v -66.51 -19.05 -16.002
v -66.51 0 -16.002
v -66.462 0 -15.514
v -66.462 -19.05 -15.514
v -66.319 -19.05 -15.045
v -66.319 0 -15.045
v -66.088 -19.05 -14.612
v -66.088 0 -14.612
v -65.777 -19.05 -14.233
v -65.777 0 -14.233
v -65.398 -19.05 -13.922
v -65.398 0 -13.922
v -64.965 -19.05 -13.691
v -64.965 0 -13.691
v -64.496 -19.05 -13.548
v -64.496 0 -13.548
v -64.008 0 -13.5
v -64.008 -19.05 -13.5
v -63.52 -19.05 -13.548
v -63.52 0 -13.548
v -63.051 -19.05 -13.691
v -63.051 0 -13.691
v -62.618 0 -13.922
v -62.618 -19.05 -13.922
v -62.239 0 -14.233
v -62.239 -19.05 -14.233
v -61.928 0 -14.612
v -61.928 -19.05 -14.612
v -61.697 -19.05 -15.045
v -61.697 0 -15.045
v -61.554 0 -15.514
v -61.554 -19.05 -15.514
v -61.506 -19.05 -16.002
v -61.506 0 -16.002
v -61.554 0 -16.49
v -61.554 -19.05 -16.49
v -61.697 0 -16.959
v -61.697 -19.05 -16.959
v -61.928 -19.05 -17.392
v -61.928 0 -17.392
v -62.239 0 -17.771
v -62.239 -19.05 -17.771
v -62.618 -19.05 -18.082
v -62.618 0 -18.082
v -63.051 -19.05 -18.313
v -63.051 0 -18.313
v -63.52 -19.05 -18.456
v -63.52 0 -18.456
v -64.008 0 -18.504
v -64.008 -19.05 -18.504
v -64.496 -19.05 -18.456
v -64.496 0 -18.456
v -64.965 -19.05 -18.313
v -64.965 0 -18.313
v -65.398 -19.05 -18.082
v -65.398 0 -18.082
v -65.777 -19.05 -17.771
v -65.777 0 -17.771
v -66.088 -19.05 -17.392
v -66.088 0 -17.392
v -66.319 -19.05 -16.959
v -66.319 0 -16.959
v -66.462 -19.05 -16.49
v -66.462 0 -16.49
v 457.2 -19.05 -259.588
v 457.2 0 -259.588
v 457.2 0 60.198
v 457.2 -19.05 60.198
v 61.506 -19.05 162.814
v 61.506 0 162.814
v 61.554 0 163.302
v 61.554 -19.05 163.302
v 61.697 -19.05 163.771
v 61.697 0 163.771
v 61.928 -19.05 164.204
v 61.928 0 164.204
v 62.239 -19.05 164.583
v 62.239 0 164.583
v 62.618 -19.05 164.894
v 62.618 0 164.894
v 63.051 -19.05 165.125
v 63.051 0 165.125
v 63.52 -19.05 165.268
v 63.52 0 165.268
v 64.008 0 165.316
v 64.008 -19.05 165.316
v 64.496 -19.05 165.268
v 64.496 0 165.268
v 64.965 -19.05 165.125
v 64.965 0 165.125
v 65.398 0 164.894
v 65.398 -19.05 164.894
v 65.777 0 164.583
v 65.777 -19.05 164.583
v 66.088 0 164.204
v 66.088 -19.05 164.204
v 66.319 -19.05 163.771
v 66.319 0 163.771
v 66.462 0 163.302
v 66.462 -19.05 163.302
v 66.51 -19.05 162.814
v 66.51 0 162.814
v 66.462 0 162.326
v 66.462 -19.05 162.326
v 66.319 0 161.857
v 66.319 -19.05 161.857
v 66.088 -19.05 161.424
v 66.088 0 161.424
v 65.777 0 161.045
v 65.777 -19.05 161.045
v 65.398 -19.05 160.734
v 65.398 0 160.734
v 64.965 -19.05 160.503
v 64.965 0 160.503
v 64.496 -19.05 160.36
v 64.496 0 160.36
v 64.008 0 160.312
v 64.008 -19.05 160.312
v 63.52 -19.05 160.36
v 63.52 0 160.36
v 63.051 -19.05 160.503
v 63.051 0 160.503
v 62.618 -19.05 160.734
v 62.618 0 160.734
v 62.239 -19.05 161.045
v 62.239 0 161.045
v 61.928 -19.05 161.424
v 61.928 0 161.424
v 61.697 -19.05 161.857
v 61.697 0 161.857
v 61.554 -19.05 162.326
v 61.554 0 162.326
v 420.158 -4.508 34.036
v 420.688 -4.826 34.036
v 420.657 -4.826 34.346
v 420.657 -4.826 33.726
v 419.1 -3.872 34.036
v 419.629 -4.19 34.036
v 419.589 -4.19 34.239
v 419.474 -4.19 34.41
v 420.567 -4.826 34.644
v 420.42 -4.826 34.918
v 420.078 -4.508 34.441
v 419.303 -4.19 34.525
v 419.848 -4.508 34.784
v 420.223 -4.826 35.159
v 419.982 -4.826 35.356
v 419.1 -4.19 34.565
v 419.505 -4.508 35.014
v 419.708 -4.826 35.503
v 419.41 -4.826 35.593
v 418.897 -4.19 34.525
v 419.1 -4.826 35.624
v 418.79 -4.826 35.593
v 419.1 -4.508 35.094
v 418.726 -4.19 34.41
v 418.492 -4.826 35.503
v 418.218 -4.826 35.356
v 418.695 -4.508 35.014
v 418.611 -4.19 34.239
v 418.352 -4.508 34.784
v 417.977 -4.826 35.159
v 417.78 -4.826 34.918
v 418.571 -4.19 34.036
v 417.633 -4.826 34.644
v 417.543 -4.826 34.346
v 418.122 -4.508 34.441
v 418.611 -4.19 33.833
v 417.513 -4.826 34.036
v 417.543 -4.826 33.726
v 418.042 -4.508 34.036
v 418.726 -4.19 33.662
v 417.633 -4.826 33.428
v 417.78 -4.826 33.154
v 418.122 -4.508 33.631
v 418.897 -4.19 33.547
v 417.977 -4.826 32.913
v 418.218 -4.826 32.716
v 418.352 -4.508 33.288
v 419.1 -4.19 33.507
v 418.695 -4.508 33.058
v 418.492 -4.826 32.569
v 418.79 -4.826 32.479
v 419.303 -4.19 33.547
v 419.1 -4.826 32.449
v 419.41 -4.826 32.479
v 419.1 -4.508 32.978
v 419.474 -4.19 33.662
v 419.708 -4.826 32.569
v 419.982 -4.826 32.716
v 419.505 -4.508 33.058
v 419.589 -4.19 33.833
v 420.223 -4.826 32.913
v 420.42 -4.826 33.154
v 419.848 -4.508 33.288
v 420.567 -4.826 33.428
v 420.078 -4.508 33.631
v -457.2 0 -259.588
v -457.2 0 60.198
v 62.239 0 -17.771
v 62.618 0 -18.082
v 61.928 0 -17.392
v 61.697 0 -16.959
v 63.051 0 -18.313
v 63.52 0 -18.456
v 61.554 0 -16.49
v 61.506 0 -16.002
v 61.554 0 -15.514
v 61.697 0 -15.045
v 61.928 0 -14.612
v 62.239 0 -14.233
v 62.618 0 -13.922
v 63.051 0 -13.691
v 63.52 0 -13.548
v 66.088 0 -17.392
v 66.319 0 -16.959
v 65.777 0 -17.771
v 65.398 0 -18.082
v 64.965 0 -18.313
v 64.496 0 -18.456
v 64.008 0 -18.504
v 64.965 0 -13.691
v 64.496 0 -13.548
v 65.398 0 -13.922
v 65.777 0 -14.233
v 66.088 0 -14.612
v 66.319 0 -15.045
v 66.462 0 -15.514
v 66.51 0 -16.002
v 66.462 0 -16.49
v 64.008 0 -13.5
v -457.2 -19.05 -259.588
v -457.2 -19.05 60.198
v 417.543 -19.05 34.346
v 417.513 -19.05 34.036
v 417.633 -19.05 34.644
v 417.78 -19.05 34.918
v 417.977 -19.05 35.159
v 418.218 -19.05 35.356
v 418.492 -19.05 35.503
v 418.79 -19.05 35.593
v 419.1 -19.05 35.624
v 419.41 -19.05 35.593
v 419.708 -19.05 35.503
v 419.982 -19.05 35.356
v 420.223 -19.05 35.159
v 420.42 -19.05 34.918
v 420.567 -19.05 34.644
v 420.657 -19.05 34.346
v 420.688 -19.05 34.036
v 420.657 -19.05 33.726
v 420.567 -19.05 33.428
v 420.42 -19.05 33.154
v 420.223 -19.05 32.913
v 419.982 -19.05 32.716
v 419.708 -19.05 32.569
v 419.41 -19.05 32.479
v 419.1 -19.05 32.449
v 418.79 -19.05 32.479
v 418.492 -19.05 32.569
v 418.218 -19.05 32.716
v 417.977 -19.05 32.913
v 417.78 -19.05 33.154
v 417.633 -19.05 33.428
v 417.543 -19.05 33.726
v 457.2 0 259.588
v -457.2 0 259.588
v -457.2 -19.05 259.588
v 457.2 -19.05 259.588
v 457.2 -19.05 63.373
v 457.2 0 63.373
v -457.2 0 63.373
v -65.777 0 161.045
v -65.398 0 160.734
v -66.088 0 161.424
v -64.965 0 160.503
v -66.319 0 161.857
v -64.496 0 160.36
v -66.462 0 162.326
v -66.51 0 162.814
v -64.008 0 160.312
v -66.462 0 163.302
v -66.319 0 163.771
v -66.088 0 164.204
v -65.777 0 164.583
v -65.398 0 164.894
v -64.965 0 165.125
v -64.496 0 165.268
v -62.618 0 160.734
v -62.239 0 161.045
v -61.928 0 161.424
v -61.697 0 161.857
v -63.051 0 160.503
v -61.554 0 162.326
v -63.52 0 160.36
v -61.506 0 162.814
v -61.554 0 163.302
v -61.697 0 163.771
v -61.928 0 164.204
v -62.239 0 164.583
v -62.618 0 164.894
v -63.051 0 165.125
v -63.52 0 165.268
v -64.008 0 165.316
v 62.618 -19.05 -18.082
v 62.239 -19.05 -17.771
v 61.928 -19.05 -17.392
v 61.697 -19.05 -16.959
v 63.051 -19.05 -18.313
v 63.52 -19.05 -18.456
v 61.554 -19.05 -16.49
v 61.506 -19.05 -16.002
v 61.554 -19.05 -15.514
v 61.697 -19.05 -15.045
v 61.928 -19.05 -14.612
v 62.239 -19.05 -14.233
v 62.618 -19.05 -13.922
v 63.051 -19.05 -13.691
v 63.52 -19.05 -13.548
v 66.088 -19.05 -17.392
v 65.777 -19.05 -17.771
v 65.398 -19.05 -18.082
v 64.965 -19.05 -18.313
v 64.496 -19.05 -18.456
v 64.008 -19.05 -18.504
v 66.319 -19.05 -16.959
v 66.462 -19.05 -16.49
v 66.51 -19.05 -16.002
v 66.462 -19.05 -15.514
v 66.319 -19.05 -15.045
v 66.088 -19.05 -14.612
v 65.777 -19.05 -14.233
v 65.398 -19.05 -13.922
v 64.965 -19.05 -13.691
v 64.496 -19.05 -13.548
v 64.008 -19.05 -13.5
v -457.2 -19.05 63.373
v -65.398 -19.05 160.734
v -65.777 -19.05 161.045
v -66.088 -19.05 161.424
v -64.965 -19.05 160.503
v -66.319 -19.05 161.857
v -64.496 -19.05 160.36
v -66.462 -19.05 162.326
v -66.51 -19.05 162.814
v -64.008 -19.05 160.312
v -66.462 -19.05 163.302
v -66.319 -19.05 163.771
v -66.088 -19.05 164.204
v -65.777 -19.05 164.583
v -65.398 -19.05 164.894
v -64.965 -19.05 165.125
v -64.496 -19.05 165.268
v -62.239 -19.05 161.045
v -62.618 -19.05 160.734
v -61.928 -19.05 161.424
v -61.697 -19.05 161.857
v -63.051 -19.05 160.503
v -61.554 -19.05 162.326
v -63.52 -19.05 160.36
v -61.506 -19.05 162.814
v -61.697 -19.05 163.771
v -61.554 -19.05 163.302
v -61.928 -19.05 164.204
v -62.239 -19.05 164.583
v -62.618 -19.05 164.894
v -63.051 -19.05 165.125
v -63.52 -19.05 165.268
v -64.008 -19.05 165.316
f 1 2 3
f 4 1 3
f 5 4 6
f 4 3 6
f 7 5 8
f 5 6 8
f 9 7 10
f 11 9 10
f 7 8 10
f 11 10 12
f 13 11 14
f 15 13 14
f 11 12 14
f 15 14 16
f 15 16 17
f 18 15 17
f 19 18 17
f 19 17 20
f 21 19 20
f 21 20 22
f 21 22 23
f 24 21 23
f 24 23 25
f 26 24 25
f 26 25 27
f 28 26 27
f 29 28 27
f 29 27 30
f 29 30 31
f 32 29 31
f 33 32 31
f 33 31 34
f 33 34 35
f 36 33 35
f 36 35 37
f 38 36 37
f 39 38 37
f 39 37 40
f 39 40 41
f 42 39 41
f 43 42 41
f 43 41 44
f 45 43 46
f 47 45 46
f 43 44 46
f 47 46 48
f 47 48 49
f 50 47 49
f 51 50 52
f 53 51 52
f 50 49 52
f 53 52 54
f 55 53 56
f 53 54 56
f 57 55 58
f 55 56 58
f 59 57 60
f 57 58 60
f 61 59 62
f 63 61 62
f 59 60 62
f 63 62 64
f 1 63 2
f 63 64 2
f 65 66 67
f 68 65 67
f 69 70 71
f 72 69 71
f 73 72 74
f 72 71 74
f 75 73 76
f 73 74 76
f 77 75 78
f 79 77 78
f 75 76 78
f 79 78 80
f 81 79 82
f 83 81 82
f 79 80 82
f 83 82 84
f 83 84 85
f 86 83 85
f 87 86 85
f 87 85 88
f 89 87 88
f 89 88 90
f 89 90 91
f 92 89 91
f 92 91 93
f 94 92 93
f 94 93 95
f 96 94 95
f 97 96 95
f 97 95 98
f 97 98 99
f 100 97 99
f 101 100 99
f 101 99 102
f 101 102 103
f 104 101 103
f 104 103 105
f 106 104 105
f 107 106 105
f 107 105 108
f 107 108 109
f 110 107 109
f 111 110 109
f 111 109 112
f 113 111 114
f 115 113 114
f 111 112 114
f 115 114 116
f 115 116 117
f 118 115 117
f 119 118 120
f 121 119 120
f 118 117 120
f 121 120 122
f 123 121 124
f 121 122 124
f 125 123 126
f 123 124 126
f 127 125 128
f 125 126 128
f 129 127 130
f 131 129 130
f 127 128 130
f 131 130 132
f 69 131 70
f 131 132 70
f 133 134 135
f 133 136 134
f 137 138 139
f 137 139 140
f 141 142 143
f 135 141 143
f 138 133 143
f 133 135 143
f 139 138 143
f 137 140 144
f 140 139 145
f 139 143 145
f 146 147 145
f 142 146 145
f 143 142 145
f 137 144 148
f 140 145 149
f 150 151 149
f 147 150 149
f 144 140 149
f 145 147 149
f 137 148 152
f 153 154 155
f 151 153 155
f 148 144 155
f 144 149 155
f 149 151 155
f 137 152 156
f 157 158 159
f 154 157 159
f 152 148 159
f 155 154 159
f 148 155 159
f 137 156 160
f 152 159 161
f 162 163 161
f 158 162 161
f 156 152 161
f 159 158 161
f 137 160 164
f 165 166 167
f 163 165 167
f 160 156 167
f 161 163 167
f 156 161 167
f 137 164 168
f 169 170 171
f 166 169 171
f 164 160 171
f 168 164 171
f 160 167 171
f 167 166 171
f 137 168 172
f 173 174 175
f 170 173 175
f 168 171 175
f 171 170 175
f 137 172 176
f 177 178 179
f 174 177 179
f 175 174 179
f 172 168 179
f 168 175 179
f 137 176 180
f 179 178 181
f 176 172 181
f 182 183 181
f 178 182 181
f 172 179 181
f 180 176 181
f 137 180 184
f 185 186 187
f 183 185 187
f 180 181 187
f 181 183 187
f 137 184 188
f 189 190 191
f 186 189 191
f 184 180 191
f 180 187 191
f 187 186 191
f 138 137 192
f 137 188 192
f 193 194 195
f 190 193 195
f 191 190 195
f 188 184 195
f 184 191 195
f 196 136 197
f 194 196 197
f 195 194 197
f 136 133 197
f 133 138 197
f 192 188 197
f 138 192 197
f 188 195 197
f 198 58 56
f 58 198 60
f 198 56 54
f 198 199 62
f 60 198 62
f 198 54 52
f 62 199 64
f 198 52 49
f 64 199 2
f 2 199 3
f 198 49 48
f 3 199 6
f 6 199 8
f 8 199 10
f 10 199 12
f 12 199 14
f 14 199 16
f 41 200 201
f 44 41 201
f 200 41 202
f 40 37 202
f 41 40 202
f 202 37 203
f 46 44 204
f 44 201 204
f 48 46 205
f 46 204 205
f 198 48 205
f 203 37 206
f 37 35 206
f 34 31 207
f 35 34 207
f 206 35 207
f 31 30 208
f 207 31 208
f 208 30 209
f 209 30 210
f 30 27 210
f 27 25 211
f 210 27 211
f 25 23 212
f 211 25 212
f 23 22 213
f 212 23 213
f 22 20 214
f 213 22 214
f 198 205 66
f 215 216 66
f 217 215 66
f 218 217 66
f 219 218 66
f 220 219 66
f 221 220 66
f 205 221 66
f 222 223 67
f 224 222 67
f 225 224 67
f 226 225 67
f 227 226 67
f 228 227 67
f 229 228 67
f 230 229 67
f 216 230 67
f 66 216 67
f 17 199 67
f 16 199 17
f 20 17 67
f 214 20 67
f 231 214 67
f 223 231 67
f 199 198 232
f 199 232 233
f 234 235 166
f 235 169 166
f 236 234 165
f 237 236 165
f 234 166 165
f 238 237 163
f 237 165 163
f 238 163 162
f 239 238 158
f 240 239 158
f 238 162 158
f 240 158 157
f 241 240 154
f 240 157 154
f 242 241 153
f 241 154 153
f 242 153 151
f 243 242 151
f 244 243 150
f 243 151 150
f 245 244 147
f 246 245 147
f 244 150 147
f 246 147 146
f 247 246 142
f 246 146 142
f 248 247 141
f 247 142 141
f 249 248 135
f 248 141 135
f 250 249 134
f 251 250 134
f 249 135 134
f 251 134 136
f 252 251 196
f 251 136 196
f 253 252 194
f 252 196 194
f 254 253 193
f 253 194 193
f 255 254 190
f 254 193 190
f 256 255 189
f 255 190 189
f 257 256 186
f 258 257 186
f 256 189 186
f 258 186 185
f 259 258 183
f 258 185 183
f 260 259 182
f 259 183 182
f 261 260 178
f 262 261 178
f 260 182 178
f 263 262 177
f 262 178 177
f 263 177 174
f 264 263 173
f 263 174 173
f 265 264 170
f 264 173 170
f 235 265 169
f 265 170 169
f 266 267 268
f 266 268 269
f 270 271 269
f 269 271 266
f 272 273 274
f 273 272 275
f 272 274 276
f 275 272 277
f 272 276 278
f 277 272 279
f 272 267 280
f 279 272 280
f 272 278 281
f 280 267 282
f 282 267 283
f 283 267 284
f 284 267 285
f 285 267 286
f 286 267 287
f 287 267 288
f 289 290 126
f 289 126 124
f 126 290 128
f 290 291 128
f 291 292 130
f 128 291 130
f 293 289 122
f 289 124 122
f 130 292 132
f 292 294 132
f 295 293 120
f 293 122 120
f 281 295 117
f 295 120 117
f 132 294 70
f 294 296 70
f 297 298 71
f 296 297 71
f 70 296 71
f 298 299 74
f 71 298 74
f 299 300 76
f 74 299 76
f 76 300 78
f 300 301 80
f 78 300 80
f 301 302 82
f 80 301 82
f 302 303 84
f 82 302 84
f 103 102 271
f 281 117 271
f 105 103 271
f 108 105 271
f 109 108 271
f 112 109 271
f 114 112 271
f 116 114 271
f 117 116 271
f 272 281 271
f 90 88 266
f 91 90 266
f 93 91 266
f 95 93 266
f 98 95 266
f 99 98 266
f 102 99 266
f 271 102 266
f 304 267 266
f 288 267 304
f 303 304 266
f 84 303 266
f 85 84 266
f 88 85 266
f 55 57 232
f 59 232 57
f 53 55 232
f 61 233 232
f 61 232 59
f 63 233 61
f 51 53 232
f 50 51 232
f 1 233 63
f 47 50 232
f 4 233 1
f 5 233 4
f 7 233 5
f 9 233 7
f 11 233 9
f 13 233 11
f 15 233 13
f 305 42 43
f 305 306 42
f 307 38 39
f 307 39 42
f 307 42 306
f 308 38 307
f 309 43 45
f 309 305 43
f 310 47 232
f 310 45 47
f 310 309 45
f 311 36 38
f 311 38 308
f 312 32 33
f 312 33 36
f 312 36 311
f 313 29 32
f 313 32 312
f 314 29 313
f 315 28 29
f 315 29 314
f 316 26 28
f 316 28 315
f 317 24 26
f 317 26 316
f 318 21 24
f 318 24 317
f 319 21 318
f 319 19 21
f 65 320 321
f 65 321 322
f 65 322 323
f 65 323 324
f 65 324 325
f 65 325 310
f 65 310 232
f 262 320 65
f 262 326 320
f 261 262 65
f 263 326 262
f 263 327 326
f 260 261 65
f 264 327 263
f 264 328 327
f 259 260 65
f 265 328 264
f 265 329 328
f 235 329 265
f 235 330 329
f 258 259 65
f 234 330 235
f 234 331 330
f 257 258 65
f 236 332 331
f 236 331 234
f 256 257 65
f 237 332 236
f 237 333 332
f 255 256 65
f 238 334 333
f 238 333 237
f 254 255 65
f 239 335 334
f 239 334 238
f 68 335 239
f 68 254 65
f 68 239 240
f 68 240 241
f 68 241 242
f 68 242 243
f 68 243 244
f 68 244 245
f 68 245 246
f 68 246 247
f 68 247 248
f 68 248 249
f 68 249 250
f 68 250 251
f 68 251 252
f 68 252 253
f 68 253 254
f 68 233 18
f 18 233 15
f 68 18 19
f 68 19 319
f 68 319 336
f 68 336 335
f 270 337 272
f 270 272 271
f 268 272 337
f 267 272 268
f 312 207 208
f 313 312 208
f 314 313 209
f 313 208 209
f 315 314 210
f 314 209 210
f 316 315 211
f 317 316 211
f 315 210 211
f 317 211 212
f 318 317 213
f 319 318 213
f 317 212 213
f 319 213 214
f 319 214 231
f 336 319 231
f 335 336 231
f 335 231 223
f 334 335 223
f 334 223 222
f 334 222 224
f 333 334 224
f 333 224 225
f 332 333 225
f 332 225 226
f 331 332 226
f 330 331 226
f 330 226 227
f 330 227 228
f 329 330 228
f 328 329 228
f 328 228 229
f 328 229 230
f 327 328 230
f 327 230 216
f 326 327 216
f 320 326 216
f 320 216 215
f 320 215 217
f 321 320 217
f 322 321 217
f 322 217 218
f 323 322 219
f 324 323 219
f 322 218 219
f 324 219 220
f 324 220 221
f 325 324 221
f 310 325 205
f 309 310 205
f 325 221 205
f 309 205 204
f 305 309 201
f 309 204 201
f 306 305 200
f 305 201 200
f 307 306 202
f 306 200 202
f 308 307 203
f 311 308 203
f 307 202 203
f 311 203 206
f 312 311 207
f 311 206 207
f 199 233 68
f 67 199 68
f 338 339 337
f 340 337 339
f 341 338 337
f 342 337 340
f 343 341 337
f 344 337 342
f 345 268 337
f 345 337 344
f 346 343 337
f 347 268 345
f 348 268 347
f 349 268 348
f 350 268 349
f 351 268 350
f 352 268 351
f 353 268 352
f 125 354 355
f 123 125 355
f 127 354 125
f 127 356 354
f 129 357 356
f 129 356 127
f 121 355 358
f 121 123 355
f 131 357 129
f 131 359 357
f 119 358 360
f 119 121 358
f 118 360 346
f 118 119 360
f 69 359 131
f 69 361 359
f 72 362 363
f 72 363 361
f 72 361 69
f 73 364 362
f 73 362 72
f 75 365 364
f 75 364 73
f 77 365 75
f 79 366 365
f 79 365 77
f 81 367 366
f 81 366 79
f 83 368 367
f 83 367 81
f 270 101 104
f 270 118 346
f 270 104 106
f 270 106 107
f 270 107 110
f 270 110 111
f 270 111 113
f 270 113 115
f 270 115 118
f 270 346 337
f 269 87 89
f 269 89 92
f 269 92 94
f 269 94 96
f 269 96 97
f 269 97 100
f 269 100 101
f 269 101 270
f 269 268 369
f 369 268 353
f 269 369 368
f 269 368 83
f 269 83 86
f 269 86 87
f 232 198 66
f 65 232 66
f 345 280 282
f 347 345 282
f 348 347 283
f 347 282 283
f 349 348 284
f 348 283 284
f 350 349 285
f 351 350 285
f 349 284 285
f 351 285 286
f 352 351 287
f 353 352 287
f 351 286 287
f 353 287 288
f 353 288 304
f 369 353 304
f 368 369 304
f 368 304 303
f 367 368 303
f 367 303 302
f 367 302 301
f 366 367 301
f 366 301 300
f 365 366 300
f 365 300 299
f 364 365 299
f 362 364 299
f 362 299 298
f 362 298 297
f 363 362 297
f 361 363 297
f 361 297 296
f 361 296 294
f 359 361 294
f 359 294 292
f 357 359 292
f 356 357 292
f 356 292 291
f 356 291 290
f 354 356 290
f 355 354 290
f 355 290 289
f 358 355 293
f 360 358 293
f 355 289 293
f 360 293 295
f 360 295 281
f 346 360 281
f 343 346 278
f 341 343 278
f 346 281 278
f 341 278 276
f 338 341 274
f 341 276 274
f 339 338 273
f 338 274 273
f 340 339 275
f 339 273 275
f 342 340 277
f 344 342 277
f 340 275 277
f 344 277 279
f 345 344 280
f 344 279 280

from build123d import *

# Parameters (mm, degrees)
F0_W     = 914.4
F0_H     = 519.176
F1_DEPTH = 19.05
F3_D     = 5.0038
F3_DEPTH = 25.4
F3_TIP   = 1.5032931827
F5_D     = 3.175
F5_DEPTH = 14.224
F5_TIP   = 0.9538662327
F6_W     = 914.4
F6_H     = 3.175
F7_DEPTH = 25.4


with BuildPart() as f1:
    # F0 (on Front) → F1 (new body)
    with BuildSketch(Plane.XZ):
        Rectangle(F0_W, F0_H)
    extrude(amount=F1_DEPTH)

    # F3
    with Locations(Plane.XZ.offset(19.05)):
        with Locations((-64.008, 162.814), (64.008, 162.814), (-64.008, -16.002), (64.008, -16.002)):
            Hole(F3_D / 2, depth=F3_DEPTH)
            with Locations((0, 0, -(F3_DEPTH + F3_TIP / 2))):  # 118° drill point
                Cone(0, F3_D / 2, F3_TIP, mode=Mode.SUBTRACT)

    # F5
    with Locations(Plane.XZ.offset(19.05)):
        with Locations((419.1, 34.036)):
            Hole(F5_D / 2, depth=F5_DEPTH)
            with Locations((0, 0, -(F5_DEPTH + F5_TIP / 2))):  # 118° drill point
                Cone(0, F5_D / 2, F5_TIP, mode=Mode.SUBTRACT)

    # F6 (on face) → F7 (cut)
    with BuildSketch(Plane.XZ.offset(19.05)):
        with Locations((0, 61.7855)):
            Rectangle(F6_W, F6_H)
    extrude(amount=-F7_DEPTH, mode=Mode.SUBTRACT)


solid = f1.part
